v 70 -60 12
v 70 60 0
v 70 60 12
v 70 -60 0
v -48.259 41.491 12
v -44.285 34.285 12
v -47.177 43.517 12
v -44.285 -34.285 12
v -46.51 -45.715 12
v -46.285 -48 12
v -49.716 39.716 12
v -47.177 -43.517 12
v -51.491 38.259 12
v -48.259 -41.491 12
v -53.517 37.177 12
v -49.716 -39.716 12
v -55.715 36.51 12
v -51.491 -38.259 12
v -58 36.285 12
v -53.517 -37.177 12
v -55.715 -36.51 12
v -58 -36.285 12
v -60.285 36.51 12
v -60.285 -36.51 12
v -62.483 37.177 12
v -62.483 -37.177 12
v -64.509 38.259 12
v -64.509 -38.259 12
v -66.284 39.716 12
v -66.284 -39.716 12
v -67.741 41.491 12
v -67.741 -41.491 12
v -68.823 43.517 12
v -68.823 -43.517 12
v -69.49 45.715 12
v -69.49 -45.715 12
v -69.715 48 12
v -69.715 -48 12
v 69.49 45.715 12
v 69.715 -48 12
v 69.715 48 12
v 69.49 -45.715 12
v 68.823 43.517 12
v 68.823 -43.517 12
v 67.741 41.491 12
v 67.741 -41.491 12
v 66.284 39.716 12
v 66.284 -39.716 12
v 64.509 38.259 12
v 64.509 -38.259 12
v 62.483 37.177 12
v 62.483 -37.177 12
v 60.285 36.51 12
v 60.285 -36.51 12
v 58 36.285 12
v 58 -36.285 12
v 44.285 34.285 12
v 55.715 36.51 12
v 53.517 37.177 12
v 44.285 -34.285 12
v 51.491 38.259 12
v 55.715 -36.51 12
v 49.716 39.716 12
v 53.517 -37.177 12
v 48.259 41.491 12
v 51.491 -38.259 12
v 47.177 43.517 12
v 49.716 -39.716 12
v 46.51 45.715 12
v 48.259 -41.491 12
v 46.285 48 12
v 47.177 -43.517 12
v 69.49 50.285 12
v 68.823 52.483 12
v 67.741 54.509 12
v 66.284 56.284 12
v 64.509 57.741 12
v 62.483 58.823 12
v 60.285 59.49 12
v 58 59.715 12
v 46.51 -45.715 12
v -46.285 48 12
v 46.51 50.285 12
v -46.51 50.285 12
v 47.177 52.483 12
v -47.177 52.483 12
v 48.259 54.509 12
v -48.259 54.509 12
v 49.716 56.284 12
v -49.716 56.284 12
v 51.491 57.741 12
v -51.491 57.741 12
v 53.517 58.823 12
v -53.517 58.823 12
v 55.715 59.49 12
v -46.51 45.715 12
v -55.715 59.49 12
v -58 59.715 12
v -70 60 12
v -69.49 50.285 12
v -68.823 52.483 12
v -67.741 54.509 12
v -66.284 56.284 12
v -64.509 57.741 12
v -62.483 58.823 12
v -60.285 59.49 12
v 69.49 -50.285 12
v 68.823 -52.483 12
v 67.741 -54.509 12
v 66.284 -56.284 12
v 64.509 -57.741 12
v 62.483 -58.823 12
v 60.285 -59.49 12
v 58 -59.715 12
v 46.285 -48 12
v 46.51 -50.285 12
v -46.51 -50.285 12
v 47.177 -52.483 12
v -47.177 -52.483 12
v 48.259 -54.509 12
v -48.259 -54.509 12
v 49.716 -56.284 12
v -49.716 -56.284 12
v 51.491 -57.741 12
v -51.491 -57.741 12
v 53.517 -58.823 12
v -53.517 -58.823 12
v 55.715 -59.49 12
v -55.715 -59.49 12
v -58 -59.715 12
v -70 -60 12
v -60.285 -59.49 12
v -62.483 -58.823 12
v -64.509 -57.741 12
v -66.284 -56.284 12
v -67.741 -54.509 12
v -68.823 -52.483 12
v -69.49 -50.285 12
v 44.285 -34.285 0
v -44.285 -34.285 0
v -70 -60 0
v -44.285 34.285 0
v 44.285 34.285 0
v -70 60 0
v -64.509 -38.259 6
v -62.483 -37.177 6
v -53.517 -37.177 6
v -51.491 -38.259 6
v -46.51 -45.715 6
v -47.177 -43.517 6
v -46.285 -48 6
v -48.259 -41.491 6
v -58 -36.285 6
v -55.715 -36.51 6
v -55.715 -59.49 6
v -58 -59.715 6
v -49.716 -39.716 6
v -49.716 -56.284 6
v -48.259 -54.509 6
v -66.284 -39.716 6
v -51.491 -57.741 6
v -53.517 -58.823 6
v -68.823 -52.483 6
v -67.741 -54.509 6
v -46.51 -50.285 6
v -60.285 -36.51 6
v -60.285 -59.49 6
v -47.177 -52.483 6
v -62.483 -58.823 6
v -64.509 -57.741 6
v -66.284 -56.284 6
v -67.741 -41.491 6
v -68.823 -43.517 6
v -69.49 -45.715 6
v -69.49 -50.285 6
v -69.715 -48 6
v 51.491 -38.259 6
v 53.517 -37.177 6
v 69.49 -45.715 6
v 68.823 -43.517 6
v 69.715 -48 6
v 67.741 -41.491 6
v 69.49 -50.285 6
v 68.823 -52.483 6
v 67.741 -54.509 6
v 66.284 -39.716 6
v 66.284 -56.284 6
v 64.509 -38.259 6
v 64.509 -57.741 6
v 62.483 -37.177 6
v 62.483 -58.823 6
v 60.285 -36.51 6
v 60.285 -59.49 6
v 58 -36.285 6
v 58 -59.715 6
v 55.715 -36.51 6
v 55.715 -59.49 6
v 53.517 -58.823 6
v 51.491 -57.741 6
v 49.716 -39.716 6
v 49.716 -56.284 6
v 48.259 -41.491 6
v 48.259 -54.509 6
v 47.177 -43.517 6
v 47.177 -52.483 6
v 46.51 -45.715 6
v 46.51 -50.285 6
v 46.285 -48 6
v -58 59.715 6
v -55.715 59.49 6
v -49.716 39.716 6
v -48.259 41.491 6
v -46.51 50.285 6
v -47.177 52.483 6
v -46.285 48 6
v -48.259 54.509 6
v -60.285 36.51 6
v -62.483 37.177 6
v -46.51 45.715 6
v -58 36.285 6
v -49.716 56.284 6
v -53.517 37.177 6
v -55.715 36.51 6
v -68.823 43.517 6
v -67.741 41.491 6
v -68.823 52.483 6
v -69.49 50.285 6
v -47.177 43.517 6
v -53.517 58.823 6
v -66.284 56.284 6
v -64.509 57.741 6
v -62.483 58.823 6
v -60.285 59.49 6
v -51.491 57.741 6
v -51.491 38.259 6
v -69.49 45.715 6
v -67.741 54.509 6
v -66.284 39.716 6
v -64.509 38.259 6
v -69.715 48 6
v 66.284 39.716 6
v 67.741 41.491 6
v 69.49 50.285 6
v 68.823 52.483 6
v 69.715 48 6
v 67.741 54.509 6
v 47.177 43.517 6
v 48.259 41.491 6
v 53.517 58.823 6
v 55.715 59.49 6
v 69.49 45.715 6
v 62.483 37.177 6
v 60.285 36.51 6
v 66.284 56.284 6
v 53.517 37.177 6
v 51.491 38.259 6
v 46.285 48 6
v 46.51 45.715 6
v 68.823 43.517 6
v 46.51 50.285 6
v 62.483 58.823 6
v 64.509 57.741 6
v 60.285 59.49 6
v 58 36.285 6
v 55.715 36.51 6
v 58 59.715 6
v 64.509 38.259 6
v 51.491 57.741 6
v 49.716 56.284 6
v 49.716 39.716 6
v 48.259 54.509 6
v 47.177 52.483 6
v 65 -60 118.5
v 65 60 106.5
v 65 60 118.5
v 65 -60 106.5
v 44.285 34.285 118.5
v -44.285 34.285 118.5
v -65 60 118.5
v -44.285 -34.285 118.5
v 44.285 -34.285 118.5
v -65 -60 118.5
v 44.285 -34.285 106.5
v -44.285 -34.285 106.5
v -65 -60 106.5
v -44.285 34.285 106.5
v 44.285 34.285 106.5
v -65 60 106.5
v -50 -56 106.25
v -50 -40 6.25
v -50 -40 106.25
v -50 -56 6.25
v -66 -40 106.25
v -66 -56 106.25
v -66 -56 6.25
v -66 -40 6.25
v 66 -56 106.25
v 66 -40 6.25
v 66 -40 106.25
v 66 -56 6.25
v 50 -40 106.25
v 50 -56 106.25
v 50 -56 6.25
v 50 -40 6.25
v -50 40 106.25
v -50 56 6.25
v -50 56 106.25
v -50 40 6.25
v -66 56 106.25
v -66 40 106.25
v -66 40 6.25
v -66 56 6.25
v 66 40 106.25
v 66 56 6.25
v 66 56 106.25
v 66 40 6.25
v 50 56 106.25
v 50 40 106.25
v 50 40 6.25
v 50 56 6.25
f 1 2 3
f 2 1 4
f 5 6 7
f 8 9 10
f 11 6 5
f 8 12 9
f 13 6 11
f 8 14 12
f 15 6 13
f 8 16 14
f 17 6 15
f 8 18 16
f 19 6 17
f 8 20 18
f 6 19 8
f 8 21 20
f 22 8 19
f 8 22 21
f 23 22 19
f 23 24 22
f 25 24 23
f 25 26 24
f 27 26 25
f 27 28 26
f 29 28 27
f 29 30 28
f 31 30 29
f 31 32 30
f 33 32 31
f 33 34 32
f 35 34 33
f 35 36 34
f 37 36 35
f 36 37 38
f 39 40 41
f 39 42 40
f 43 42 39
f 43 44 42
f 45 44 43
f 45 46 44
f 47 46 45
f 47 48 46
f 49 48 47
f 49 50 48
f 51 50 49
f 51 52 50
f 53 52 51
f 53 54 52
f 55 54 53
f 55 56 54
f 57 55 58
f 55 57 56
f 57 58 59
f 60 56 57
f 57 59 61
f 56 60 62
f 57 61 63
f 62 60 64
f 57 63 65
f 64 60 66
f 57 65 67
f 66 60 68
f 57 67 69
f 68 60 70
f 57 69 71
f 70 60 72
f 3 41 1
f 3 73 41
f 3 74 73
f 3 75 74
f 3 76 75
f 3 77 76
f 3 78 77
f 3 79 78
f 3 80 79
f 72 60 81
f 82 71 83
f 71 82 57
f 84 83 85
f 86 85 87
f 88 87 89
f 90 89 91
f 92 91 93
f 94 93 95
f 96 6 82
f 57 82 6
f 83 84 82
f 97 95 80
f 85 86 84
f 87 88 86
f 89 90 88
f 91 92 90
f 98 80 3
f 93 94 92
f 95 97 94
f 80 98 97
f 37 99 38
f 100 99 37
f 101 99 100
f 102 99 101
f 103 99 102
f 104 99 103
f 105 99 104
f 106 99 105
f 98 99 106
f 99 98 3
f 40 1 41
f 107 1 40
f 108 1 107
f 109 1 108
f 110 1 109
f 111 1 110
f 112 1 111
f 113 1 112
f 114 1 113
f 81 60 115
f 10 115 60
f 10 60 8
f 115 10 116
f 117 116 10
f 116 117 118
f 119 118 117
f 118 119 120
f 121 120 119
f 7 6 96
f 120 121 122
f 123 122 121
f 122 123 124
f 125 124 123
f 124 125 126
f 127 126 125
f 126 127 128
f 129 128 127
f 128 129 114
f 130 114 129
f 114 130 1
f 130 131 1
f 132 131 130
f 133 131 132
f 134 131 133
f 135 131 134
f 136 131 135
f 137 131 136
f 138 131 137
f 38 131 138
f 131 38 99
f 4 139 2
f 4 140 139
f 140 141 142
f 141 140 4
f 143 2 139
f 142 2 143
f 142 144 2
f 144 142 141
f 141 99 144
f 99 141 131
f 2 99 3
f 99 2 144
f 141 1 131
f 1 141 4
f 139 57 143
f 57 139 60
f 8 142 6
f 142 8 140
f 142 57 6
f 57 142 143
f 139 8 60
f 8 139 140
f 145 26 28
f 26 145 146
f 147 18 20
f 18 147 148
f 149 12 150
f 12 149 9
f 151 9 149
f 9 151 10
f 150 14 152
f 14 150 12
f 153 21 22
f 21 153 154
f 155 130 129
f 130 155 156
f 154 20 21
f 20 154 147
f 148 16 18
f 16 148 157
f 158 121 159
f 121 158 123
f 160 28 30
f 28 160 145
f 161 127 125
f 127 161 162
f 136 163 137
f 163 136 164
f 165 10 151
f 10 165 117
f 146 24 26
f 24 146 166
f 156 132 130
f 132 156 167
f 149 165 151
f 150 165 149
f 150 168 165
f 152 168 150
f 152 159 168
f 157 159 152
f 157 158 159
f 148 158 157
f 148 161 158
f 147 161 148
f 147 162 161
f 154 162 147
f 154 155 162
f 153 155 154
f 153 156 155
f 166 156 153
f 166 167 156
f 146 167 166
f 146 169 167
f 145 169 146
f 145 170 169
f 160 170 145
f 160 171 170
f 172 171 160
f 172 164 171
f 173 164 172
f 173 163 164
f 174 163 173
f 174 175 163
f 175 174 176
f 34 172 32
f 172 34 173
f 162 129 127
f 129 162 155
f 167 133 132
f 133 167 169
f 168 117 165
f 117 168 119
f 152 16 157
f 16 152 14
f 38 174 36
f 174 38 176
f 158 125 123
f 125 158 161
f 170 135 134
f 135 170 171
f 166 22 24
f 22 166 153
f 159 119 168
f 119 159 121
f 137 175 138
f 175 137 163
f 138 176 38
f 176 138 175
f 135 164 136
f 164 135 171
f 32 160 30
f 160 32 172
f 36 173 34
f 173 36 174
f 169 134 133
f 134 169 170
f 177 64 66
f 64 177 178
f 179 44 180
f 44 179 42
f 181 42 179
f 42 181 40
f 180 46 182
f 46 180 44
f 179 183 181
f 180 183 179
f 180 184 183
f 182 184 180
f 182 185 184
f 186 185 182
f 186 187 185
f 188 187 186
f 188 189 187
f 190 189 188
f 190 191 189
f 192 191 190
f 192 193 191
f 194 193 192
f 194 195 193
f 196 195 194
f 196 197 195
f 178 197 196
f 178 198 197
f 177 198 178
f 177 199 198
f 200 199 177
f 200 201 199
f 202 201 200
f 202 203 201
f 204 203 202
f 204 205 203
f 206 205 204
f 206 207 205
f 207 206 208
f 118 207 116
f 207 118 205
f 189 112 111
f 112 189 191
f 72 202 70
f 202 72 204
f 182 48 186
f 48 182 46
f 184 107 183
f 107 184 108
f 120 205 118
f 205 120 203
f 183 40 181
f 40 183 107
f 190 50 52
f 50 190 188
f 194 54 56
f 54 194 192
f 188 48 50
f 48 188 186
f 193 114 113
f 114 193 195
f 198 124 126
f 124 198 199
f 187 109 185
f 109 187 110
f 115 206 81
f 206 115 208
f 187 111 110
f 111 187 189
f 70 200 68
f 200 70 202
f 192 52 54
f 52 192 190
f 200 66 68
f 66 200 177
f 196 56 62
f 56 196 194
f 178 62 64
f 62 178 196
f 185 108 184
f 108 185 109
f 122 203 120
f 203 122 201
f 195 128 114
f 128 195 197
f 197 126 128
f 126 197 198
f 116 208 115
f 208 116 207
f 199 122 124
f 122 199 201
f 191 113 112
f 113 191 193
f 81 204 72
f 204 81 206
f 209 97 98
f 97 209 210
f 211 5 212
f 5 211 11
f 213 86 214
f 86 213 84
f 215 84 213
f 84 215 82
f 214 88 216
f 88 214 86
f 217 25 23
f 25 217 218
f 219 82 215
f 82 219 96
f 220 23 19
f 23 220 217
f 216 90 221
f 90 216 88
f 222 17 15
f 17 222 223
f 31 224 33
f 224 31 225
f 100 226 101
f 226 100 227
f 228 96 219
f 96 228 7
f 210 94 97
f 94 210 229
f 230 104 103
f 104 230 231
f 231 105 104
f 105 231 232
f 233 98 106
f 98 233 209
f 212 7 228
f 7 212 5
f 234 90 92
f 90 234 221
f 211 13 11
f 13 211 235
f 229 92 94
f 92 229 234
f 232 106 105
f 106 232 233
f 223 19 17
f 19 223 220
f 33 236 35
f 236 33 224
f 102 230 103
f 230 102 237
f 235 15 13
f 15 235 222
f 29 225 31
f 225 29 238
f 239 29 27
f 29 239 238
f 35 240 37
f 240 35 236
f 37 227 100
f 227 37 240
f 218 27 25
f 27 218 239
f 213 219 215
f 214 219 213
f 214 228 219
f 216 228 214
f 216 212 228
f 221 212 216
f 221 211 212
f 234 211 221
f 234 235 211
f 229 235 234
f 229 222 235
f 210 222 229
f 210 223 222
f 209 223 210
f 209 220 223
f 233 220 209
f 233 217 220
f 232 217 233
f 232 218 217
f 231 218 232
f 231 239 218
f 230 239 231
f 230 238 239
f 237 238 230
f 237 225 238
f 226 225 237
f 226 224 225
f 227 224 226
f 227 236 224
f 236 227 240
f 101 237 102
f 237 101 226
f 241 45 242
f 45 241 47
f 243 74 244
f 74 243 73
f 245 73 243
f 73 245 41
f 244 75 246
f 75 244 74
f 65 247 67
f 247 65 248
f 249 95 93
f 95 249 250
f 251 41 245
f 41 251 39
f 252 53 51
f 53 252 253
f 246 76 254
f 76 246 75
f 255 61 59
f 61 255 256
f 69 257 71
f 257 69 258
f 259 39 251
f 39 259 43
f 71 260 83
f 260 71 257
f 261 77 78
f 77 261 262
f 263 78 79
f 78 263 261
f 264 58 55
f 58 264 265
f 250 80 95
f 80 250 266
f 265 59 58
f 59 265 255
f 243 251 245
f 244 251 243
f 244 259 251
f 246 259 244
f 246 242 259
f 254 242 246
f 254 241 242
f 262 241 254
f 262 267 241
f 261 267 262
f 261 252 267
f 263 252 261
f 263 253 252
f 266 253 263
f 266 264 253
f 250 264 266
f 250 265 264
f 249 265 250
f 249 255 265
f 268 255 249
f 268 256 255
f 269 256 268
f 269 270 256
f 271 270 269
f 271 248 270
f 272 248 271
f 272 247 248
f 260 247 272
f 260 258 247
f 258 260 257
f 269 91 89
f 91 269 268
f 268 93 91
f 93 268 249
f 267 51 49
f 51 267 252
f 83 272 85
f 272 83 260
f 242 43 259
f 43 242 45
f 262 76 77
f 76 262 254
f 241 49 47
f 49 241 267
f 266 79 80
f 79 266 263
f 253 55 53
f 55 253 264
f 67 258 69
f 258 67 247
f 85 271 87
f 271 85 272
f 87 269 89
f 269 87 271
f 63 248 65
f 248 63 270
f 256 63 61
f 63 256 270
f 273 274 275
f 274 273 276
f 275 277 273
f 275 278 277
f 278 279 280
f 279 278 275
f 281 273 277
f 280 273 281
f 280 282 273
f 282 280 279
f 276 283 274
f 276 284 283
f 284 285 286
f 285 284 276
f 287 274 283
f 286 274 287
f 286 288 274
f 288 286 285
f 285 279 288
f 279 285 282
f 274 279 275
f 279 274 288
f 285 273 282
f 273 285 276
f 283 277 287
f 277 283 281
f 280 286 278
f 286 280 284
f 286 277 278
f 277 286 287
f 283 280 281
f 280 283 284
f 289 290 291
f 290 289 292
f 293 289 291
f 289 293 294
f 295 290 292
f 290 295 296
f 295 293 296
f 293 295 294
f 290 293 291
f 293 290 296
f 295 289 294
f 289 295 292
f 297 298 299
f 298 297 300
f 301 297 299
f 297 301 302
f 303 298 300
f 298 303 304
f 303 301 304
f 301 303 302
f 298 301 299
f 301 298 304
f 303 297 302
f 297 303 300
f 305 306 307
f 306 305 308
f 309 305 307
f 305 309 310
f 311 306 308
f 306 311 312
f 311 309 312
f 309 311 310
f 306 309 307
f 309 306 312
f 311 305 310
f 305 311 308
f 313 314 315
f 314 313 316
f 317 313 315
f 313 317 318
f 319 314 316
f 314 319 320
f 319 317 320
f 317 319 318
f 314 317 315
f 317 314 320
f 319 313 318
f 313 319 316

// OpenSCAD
$fn = 32;

// ------------------------------------------------------------------------
// Frame cube: base 140 x 120 mm, posts 100 mm tall
// Every part is its own module, assembly() places every instance.
// ------------------------------------------------------------------------

// --- part 1 ---
module base_frame() {
  difference() {
    translate([-70, -60, 0]) cube([140, 120, 12]);
    translate([-44.285, -34.285, -1]) cube([88.57, 68.57, 14]);
    translate([-58, -48, 6]) cylinder(h = 7, d = 23.43);
    translate([58, -48, 6]) cylinder(h = 7, d = 23.43);
    translate([-58, 48, 6]) cylinder(h = 7, d = 23.43);
    translate([58, 48, 6]) cylinder(h = 7, d = 23.43);
  }
}

// --- part 2 ---
module corner_post() {
  translate([-8, -8, 0]) cube([16, 16, 100]);
}

// --- part 3 ---
module top_frame() {
  difference() {
    translate([-65, -60, 0]) cube([130, 120, 12]);
    translate([-44.285, -34.285, -1]) cube([88.57, 68.57, 14]);
  }
}

// --- assembly ---
module assembly() {
  color([0.80, 0.24, 0.20]) translate([0, 0, 0]) rotate([0, 0, 0]) base_frame();
  color([0.20, 0.45, 0.75]) translate([-58, -48, 6.25]) rotate([0, 0, 0]) corner_post();
  color([0.25, 0.62, 0.32]) translate([58, -48, 6.25]) rotate([0, 0, 0]) corner_post();
  color([0.92, 0.70, 0.18]) translate([-58, 48, 6.25]) rotate([0, 0, 0]) corner_post();
  color([0.58, 0.35, 0.70]) translate([58, 48, 6.25]) rotate([0, 0, 0]) corner_post();
  color([0.16, 0.66, 0.66]) translate([0, 0, 106.5]) rotate([0, 0, 0]) top_frame();
}

assembly();
